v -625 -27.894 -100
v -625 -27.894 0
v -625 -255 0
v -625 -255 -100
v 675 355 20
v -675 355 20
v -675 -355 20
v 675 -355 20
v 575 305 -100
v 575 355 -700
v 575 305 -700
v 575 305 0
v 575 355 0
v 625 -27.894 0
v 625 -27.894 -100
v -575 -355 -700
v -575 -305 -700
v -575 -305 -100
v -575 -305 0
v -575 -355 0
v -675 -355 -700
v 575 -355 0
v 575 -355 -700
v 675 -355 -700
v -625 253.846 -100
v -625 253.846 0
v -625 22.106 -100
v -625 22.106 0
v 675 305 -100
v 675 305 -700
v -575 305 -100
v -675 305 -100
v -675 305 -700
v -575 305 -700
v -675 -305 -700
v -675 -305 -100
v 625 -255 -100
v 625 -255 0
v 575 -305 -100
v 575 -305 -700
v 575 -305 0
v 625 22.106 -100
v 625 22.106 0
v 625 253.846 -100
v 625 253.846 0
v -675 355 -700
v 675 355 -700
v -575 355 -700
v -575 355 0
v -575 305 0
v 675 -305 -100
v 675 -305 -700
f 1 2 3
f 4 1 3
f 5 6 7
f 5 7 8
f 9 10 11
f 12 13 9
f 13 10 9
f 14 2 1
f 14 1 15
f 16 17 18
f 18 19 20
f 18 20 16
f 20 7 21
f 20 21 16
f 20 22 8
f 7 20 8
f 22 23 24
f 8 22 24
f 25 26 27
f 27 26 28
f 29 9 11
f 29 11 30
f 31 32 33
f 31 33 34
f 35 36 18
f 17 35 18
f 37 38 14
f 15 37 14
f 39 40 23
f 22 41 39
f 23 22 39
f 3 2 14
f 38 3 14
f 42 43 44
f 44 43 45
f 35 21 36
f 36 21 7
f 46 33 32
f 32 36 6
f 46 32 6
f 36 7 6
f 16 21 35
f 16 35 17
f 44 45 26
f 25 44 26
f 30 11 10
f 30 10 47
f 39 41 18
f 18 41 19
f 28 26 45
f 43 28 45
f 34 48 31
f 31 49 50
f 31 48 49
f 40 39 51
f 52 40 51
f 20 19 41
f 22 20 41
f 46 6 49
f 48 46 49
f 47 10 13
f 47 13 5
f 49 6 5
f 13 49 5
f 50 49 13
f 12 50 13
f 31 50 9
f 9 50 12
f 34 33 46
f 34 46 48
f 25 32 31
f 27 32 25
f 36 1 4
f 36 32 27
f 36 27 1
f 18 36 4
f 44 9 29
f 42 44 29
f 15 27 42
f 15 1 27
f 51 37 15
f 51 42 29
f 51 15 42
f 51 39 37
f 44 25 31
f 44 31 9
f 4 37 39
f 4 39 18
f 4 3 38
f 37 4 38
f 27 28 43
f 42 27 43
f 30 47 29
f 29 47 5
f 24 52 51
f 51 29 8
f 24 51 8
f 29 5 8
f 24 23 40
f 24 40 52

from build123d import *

# Parameters (mm, degrees)
F0_W     = 1350
F0_H     = 710
F1_DEPTH = 20
F2_W     = 100
F2_H     = 50
F3_DEPTH = 700
F4_W     = 1250
F4_H     = 50
F5_DEPTH = 100


with BuildPart() as f1:
    # F0 (on Top) → F1 (new body)
    with BuildSketch(Plane.XY):
        Rectangle(F0_W, F0_H)
    extrude(amount=F1_DEPTH)

    # F2 (on face) → F3 (join)
    with BuildSketch(Plane(origin=(0, 0, 0), x_dir=(1, 0, 0), z_dir=(0, 0, -1))):
        with Locations((625, -330)):
            Rectangle(F2_W, F2_H)
        with Locations((-625, 330)):
            Rectangle(F2_W, F2_H)
        with Locations((625, 330)):
            Rectangle(F2_W, F2_H)
        with Locations((-625, -330)):
            Rectangle(F2_W, F2_H)
    extrude(amount=F3_DEPTH)

    # F4 (on face) → F5 (join)
    with BuildSketch(Plane(origin=(0, 0, 0), x_dir=(1, 0, 0), z_dir=(0, 0, -1))):
        Polygon((-625, 305), (-675, 305), (-675, -305), (-625, -305), (-625, -253.84596), (-625, -22.106195), (-625, 27.893805), (-625, 255), align=None)
        Polygon((-575, 305), (-625, 305), (-625, 255), (625, 255), (625, 305), (575, 305), align=None)
        Polygon((-625, -253.84596), (-625, -305), (-575, -305), (575, -305), (625, -305), (625, -253.84596), align=None)
        Polygon((625, 305), (625, 255), (625, 27.893805), (625, -22.106195), (625, -253.84596), (625, -305), (675, -305), (675, 305), align=None)
        with Locations((0, 2.893805)):
            Rectangle(F4_W, F4_H)
    extrude(amount=F5_DEPTH)


solid = f1.part
